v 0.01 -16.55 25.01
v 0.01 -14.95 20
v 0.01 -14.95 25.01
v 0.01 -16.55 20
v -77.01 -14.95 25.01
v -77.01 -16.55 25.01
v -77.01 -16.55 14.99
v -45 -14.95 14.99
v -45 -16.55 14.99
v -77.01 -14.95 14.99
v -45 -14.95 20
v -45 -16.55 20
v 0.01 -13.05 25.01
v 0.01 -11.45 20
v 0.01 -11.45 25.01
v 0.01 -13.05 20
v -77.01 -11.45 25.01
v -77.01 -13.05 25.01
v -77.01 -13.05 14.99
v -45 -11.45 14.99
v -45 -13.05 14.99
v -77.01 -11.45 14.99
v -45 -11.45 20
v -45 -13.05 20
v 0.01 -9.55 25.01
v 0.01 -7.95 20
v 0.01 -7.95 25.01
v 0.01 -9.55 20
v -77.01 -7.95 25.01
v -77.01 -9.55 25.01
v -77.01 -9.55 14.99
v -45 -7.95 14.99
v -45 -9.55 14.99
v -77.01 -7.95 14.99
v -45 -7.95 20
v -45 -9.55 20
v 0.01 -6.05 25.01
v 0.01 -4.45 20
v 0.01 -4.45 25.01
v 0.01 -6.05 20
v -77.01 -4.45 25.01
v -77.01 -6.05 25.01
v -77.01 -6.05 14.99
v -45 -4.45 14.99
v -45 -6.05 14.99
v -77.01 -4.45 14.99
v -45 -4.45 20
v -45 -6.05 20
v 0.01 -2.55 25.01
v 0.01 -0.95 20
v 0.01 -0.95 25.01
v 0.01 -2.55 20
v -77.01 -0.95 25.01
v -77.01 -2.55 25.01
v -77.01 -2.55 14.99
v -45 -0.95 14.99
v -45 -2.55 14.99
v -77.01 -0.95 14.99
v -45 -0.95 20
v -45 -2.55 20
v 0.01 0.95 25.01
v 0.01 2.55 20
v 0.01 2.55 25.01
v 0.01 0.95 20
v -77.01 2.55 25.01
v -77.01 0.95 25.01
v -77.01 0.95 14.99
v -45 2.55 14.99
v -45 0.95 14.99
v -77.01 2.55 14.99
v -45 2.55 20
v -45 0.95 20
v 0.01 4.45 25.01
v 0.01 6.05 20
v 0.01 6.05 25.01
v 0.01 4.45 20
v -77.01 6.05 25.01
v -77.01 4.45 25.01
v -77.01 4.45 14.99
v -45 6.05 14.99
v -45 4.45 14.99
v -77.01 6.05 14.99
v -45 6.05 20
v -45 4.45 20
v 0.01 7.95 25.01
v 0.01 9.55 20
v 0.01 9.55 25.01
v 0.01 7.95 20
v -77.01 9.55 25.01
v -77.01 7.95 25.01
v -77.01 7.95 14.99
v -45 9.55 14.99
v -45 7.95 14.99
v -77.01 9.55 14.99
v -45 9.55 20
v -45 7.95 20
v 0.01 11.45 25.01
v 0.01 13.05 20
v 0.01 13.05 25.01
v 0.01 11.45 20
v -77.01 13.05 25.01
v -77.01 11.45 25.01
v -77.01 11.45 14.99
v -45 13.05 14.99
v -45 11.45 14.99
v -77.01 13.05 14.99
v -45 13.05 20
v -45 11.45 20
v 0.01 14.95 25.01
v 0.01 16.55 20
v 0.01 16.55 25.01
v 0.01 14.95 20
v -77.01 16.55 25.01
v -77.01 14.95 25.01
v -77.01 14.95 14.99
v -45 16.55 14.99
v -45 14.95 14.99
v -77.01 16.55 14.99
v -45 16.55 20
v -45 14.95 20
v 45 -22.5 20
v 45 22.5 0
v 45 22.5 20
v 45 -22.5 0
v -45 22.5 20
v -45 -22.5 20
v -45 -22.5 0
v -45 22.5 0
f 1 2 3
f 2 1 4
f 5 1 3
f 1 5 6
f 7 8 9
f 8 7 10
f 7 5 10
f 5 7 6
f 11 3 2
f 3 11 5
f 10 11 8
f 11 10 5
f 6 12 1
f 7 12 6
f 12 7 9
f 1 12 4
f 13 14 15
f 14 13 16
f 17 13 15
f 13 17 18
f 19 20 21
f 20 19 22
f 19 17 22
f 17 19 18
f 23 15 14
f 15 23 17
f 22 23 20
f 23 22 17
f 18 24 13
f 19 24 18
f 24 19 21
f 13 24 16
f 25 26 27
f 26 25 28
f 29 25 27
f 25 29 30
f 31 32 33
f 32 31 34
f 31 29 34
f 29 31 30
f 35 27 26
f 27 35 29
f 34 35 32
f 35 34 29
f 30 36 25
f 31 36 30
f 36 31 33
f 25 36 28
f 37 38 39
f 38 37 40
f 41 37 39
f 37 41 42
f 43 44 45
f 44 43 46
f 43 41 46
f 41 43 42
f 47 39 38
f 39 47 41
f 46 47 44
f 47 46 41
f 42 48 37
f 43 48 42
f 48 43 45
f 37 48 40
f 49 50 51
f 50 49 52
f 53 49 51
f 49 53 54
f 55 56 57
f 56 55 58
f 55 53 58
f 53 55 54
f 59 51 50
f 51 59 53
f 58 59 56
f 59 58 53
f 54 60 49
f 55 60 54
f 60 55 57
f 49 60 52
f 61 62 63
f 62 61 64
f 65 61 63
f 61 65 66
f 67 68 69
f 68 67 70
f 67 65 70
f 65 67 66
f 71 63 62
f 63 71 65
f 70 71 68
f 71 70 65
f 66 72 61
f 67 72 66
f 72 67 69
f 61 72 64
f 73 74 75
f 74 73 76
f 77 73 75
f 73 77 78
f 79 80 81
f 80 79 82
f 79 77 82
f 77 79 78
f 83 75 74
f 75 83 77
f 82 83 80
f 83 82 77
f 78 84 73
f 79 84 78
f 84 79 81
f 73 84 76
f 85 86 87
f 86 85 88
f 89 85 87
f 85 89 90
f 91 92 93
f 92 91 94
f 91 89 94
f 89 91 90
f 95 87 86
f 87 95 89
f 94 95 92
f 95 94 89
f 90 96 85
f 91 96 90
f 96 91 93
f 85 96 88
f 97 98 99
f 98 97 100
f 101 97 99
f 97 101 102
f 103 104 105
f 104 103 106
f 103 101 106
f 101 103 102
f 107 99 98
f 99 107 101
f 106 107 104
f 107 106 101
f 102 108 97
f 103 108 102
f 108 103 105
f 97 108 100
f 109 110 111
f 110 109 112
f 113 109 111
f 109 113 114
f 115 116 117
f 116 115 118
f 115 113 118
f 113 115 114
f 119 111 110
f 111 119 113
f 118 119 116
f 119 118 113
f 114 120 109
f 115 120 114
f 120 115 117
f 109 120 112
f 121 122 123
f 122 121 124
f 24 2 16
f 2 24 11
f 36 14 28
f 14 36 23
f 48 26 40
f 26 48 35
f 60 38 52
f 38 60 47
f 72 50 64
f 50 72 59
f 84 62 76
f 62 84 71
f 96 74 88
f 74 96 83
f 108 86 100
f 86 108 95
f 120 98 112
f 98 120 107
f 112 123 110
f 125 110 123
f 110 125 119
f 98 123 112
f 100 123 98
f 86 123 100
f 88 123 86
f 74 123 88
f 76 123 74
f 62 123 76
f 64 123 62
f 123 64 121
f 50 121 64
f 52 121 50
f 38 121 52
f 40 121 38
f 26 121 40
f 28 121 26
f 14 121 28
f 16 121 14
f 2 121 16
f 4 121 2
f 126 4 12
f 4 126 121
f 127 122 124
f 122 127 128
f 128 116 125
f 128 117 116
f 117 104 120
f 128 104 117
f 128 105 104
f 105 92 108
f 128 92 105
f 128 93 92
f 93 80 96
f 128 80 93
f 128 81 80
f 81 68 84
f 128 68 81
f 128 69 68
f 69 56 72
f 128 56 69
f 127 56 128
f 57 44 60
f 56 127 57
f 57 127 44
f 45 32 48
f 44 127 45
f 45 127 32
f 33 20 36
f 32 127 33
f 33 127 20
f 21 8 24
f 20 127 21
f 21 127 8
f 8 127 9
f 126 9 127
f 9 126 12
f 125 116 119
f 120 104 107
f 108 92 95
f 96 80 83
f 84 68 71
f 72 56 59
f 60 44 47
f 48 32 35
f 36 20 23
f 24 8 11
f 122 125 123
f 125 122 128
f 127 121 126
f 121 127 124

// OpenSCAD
// Drying Rack for 10 Microscope Slides
// Base dimensions
base_length = 90;   // X
base_width = 45;    // Y
base_height = 20;   // Z

// Slot dimensions
slot_length = 77;   // X
slot_width = 1.6;   // Y
slot_depth = 10;    // Z

// Slot arrangement
num_slots = 10;
slot_spacing = 3.5; // centre-to-centre in Y

// Calculate total width of the slot group
total_slot_group_width = (num_slots - 1) * slot_spacing;

// Starting Y position for the first slot (to centre the group)
start_y = -total_slot_group_width / 2;

$fn = 64;

// Base block
translate([-base_length/2, -base_width/2, 0])
    cube([base_length, base_width, base_height]);

// Cut out slots
for (i = [0 : num_slots-1]) {
    y_pos = start_y + i * slot_spacing;
    
    // Slot extends slightly past the base in X and Z to ensure clean cuts
    translate([-slot_length/2, y_pos, base_height])
        cube([slot_length + 0.02, slot_width, slot_depth + 0.02], center = true);
}
